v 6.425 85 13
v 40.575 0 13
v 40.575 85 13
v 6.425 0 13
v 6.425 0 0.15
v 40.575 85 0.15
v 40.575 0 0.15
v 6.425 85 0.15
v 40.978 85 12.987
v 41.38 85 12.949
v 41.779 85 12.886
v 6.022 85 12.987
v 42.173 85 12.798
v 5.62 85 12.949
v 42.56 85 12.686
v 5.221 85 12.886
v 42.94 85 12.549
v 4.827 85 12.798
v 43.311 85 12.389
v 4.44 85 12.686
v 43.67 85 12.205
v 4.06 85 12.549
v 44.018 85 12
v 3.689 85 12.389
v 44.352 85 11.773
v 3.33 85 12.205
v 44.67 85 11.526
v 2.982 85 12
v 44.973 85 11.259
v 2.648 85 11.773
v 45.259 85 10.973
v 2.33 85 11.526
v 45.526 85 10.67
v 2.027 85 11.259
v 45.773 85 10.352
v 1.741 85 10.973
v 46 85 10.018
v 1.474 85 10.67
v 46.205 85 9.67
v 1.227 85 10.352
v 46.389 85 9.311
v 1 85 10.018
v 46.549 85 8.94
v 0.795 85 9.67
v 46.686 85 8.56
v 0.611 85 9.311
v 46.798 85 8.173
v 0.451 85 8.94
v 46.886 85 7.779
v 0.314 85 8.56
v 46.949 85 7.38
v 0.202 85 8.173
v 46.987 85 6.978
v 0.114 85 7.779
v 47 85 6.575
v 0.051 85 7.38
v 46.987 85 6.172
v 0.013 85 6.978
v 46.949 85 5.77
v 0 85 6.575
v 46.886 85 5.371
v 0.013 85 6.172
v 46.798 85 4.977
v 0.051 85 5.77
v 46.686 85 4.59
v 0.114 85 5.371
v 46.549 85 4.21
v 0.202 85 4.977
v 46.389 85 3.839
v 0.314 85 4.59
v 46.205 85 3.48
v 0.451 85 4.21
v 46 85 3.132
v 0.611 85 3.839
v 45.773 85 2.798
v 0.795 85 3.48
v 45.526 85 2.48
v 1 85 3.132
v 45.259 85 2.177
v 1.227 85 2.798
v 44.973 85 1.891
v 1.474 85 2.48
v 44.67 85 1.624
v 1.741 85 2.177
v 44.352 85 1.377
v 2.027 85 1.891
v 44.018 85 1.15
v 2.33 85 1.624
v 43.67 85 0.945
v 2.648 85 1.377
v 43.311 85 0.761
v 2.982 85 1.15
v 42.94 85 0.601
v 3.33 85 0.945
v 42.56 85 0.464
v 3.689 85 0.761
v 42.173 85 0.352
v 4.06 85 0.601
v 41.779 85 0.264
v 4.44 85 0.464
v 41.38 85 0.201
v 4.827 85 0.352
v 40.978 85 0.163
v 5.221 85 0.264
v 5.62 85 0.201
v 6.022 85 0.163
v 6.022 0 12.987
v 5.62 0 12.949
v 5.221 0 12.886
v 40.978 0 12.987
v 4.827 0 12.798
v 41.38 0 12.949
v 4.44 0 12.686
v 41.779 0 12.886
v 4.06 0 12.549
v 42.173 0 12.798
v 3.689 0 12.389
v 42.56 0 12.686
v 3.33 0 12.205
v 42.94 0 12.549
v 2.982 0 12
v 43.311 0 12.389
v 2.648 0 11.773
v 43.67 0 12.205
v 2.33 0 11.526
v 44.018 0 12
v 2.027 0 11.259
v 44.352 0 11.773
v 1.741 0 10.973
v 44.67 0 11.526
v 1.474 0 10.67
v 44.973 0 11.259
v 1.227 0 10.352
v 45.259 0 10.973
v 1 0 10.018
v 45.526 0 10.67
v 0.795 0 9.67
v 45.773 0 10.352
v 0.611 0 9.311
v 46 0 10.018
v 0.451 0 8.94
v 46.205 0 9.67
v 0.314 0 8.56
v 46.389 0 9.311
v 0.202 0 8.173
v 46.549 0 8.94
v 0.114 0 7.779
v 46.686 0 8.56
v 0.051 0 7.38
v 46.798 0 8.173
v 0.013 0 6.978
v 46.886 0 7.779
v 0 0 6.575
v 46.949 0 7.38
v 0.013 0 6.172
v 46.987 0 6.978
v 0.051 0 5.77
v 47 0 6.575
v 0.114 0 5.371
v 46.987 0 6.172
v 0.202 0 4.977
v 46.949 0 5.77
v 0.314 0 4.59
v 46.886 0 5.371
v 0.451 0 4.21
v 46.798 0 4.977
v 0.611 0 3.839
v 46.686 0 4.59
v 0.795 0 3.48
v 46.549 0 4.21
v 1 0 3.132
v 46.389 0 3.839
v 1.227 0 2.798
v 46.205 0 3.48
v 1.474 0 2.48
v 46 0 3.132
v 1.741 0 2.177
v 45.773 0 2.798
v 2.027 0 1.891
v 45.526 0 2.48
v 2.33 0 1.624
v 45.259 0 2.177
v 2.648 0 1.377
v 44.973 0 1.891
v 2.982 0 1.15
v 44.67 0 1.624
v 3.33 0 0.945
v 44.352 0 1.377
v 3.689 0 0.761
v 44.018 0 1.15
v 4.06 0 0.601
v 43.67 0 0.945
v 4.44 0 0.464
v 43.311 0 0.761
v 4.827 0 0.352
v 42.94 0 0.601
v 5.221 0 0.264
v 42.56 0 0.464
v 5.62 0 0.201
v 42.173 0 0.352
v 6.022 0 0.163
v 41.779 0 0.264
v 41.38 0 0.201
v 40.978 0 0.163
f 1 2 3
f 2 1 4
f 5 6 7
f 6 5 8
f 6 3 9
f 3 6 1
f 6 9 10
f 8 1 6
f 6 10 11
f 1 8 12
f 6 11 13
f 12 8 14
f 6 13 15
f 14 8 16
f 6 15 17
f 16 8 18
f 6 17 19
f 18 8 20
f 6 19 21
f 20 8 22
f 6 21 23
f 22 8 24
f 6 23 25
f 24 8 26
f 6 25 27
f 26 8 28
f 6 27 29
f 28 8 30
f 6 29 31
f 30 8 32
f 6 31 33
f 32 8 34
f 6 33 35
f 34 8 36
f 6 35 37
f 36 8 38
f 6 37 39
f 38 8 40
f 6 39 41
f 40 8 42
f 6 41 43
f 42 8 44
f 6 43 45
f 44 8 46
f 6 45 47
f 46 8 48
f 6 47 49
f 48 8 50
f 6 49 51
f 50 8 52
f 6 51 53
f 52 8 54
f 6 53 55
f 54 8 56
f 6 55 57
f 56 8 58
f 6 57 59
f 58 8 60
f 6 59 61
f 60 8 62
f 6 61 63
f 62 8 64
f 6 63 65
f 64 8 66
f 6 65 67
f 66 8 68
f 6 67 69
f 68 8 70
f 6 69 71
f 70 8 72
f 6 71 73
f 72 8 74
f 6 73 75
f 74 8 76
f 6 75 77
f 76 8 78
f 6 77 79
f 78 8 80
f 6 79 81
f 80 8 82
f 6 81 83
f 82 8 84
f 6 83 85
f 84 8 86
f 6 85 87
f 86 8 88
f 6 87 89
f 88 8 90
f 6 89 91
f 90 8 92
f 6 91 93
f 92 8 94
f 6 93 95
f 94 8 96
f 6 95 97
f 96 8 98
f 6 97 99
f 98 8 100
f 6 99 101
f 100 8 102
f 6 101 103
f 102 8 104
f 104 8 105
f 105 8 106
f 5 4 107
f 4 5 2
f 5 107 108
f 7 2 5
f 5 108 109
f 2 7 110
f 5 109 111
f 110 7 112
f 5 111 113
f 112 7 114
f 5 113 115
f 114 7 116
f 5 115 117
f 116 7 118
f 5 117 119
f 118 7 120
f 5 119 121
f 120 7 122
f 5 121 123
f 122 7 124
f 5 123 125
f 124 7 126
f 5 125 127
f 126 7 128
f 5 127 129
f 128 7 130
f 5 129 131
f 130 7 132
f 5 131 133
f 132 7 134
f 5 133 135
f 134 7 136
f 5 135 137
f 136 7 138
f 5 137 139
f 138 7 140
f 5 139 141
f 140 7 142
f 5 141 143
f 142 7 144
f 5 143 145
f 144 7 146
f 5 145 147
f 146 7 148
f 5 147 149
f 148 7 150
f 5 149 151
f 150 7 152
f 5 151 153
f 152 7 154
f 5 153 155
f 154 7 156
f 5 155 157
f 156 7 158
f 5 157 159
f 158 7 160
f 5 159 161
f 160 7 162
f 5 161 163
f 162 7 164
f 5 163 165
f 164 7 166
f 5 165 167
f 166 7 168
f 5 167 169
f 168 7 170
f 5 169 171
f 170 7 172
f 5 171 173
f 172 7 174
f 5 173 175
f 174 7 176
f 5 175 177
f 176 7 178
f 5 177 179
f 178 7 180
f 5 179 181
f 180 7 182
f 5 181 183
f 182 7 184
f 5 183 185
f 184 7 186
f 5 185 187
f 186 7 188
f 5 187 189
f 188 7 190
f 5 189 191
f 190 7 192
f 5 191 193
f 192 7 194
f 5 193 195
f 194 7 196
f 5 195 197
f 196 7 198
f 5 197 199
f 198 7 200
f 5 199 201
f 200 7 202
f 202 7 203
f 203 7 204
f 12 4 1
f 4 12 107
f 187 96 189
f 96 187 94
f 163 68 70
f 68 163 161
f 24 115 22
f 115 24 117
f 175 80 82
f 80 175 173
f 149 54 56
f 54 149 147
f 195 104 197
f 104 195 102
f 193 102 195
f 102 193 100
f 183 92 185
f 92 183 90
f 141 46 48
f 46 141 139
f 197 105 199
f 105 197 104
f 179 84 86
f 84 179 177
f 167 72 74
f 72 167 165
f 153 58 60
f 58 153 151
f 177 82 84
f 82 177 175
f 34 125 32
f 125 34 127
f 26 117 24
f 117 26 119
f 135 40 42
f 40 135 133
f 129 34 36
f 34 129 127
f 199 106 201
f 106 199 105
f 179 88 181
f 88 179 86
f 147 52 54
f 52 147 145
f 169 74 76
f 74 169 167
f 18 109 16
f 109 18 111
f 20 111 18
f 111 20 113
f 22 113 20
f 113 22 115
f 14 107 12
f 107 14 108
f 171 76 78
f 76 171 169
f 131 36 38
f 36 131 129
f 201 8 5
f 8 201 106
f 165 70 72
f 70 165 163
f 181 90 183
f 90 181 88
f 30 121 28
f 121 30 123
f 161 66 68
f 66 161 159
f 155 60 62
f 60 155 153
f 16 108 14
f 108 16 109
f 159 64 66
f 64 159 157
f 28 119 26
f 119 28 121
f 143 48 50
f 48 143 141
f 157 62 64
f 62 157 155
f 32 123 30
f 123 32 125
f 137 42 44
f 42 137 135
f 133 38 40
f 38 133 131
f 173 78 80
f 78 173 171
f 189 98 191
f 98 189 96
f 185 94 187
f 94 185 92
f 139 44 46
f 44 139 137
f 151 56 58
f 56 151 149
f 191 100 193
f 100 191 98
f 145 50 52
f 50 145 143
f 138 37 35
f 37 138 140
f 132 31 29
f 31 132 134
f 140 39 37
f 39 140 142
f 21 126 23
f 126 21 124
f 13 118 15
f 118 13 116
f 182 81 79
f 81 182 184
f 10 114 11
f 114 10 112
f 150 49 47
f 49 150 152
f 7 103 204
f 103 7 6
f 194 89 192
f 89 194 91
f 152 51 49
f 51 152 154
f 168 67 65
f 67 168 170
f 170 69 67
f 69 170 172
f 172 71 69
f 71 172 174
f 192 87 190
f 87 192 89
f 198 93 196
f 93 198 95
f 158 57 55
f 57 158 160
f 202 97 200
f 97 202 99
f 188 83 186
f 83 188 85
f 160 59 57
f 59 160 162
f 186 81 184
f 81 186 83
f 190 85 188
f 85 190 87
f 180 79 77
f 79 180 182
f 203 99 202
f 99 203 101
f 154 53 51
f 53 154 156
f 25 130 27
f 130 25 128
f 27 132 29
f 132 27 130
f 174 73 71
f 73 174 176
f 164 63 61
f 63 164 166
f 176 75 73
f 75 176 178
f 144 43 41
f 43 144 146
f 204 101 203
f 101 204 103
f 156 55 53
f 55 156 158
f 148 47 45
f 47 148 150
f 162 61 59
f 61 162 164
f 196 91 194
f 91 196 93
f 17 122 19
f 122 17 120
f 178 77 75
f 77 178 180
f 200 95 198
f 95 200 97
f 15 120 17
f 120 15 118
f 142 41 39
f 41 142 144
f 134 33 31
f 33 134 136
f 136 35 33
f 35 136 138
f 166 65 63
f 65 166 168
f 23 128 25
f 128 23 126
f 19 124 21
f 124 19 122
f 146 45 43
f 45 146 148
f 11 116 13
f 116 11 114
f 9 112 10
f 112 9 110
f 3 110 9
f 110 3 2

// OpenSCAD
// file: ../libraries/wedge.scad
//Title: Wedge Module
//Author: Alex English - ProtoParadigm
//Date: 1/4/2013
//License: Creative Commons - Share Alike - Attribution

//Usage: Include in your other .scad projects and call wedge with arguments for the height of the wedge, the radius of the wedge, and the angle of the wedge in degrees.  The resulting wedge will be placed with the point at the origin, extending into the z axis, with the angle starting at the x axis and extending counter-clockwise as per the right-hand rule.

//Updated: 1/12/2013 - Increased dimensions of wedge to be revoved when angle is more than 180 as per suggestion from kitwallace.

module wedge_180(h, r, d)
{
	rotate(d) difference()
	{
		rotate(180-d) difference()
		{
			cylinder(h = h, r = r);
			translate([-(r+1), 0, -1]) cube([r*2+2, r+1, h+2]);
		}
		translate([-(r+1), 0, -1]) cube([r*2+2, r+1, h+2]);
	}
}

module wedge(h, r, d)
{
	if(d <= 180)
		wedge_180(h, r, d);
	else
		rotate(d) difference()
		{
			cylinder(h = h, r = r);
			translate([0, 0, -1]) wedge_180(h+2, r+1, 360-d);
		}
}

//Example: wedge(10, 20, 145); //would create a wedge 10 high, with a radius of 20, and an angle of 33 degrees.
// file: model_echo_auto.scad
////////////////////////////////////////////////////////////////////////
// Initial Revision:
//  2019-Jun-23
//
// Author:
//
//   David Crook <idcrook@users.noreply.github.com>
//
// Inspired by:
//
//   -
//
// Description:
//
//   Echo Auto, to be used as dimensional model:
//    https://www.amazon.com/Introducing-Echo-Auto-first-your/dp/B0753K4CWG
//
// Revisions/Notes:
//
//
////////////////////////////////////////////////////////////////////////


use <MCAD/2Dshapes.scad>
use <../libraries/wedge.scad>

e = 0.02; // small number


// Measurements, as positioned on dash mount (expressed in millimeters)
//
//  - Length 85.0 mm
//  - Depth  47.0 mm
//  - Height (shell) 12.85 mm
//  - Height (including bumpers) ~13.0-13.5 mm

ext_length = 85.0;
ext_depth = 47.0;
ext_height = 12.85;

module modelEchoAuto (length = ext_length, depth = ext_depth, height_shell = ext_height) {

  ext_height_bumper = 0.15;
  ext_height = height_shell + ext_height_bumper;
  ext_height_side_radius = (height_shell / 2);
  ext_height_side_cylinder_center_inset = ext_height_side_radius;

  depth_prism = depth - (2 * ext_height_side_cylinder_center_inset );

  difference () {
    echoAutoRoughShell(length, depth_prism, height_shell, ext_height_bumper, ext_height_side_radius);
    // TODO: top buttons
    // TODO: USB microB, aux jack
    // TODO: Front light bar
    // TODO: side slit
  }


  // TODO: bottom mount and bumber contours
  // TODO: USB microB, aux jack keepouts
}

// Rough outline of the Echo Auto
module echoAutoRoughShell (length, depth, height, height_bumpers, side_radius) {

  shellColor = "#080808A0";

   // case outer dimensions
  union () {
    // body block
    color (shellColor)
      translate([side_radius, 0, height_bumpers])
      cube([depth, length, height], center = false);

    // semicircular solid along one side
    color (shellColor)
      rotate(a = [0, 270, 270])
      translate([side_radius + height_bumpers,
                 side_radius, 0])
      linear_extrude(height = length)
    {
      circle(r=side_radius);
    }

    // semicircular solid along other side
    color (shellColor)
      rotate(a = [0, 270, 270])
      translate([side_radius + height_bumpers,
                 side_radius + depth, 0])
      linear_extrude(height = length)
    {
      circle(r=side_radius);
    }
  }

}


$fn = 100;
modelEchoAuto();
// main file
////////////////////////////////////////////////////////////////////////
// Initial Revision:
//  2019-Jun-23
//
// Author:
//
//   David Crook <idcrook@users.noreply.github.com>
//
// Inspired by:
//
//   -
//
// Description:
//
//   Alternative dash mount for Echo Auto
//
// Revisions/Notes:
//
//
////////////////////////////////////////////////////////////////////////

// contains dimensional model of Echo Auto
use <model_echo_auto.scad>

use <MCAD/2Dshapes.scad>
use <../libraries/wedge.scad>

e = 0.02; // small number

// TBD!
module dash_mount_a () {

}



showEchoAuto = false;
showEchoAuto = true;

$fn = $preview ? 12 : 100;
if (showEchoAuto) {
  modelEchoAuto();
}

dash_mount_a();
